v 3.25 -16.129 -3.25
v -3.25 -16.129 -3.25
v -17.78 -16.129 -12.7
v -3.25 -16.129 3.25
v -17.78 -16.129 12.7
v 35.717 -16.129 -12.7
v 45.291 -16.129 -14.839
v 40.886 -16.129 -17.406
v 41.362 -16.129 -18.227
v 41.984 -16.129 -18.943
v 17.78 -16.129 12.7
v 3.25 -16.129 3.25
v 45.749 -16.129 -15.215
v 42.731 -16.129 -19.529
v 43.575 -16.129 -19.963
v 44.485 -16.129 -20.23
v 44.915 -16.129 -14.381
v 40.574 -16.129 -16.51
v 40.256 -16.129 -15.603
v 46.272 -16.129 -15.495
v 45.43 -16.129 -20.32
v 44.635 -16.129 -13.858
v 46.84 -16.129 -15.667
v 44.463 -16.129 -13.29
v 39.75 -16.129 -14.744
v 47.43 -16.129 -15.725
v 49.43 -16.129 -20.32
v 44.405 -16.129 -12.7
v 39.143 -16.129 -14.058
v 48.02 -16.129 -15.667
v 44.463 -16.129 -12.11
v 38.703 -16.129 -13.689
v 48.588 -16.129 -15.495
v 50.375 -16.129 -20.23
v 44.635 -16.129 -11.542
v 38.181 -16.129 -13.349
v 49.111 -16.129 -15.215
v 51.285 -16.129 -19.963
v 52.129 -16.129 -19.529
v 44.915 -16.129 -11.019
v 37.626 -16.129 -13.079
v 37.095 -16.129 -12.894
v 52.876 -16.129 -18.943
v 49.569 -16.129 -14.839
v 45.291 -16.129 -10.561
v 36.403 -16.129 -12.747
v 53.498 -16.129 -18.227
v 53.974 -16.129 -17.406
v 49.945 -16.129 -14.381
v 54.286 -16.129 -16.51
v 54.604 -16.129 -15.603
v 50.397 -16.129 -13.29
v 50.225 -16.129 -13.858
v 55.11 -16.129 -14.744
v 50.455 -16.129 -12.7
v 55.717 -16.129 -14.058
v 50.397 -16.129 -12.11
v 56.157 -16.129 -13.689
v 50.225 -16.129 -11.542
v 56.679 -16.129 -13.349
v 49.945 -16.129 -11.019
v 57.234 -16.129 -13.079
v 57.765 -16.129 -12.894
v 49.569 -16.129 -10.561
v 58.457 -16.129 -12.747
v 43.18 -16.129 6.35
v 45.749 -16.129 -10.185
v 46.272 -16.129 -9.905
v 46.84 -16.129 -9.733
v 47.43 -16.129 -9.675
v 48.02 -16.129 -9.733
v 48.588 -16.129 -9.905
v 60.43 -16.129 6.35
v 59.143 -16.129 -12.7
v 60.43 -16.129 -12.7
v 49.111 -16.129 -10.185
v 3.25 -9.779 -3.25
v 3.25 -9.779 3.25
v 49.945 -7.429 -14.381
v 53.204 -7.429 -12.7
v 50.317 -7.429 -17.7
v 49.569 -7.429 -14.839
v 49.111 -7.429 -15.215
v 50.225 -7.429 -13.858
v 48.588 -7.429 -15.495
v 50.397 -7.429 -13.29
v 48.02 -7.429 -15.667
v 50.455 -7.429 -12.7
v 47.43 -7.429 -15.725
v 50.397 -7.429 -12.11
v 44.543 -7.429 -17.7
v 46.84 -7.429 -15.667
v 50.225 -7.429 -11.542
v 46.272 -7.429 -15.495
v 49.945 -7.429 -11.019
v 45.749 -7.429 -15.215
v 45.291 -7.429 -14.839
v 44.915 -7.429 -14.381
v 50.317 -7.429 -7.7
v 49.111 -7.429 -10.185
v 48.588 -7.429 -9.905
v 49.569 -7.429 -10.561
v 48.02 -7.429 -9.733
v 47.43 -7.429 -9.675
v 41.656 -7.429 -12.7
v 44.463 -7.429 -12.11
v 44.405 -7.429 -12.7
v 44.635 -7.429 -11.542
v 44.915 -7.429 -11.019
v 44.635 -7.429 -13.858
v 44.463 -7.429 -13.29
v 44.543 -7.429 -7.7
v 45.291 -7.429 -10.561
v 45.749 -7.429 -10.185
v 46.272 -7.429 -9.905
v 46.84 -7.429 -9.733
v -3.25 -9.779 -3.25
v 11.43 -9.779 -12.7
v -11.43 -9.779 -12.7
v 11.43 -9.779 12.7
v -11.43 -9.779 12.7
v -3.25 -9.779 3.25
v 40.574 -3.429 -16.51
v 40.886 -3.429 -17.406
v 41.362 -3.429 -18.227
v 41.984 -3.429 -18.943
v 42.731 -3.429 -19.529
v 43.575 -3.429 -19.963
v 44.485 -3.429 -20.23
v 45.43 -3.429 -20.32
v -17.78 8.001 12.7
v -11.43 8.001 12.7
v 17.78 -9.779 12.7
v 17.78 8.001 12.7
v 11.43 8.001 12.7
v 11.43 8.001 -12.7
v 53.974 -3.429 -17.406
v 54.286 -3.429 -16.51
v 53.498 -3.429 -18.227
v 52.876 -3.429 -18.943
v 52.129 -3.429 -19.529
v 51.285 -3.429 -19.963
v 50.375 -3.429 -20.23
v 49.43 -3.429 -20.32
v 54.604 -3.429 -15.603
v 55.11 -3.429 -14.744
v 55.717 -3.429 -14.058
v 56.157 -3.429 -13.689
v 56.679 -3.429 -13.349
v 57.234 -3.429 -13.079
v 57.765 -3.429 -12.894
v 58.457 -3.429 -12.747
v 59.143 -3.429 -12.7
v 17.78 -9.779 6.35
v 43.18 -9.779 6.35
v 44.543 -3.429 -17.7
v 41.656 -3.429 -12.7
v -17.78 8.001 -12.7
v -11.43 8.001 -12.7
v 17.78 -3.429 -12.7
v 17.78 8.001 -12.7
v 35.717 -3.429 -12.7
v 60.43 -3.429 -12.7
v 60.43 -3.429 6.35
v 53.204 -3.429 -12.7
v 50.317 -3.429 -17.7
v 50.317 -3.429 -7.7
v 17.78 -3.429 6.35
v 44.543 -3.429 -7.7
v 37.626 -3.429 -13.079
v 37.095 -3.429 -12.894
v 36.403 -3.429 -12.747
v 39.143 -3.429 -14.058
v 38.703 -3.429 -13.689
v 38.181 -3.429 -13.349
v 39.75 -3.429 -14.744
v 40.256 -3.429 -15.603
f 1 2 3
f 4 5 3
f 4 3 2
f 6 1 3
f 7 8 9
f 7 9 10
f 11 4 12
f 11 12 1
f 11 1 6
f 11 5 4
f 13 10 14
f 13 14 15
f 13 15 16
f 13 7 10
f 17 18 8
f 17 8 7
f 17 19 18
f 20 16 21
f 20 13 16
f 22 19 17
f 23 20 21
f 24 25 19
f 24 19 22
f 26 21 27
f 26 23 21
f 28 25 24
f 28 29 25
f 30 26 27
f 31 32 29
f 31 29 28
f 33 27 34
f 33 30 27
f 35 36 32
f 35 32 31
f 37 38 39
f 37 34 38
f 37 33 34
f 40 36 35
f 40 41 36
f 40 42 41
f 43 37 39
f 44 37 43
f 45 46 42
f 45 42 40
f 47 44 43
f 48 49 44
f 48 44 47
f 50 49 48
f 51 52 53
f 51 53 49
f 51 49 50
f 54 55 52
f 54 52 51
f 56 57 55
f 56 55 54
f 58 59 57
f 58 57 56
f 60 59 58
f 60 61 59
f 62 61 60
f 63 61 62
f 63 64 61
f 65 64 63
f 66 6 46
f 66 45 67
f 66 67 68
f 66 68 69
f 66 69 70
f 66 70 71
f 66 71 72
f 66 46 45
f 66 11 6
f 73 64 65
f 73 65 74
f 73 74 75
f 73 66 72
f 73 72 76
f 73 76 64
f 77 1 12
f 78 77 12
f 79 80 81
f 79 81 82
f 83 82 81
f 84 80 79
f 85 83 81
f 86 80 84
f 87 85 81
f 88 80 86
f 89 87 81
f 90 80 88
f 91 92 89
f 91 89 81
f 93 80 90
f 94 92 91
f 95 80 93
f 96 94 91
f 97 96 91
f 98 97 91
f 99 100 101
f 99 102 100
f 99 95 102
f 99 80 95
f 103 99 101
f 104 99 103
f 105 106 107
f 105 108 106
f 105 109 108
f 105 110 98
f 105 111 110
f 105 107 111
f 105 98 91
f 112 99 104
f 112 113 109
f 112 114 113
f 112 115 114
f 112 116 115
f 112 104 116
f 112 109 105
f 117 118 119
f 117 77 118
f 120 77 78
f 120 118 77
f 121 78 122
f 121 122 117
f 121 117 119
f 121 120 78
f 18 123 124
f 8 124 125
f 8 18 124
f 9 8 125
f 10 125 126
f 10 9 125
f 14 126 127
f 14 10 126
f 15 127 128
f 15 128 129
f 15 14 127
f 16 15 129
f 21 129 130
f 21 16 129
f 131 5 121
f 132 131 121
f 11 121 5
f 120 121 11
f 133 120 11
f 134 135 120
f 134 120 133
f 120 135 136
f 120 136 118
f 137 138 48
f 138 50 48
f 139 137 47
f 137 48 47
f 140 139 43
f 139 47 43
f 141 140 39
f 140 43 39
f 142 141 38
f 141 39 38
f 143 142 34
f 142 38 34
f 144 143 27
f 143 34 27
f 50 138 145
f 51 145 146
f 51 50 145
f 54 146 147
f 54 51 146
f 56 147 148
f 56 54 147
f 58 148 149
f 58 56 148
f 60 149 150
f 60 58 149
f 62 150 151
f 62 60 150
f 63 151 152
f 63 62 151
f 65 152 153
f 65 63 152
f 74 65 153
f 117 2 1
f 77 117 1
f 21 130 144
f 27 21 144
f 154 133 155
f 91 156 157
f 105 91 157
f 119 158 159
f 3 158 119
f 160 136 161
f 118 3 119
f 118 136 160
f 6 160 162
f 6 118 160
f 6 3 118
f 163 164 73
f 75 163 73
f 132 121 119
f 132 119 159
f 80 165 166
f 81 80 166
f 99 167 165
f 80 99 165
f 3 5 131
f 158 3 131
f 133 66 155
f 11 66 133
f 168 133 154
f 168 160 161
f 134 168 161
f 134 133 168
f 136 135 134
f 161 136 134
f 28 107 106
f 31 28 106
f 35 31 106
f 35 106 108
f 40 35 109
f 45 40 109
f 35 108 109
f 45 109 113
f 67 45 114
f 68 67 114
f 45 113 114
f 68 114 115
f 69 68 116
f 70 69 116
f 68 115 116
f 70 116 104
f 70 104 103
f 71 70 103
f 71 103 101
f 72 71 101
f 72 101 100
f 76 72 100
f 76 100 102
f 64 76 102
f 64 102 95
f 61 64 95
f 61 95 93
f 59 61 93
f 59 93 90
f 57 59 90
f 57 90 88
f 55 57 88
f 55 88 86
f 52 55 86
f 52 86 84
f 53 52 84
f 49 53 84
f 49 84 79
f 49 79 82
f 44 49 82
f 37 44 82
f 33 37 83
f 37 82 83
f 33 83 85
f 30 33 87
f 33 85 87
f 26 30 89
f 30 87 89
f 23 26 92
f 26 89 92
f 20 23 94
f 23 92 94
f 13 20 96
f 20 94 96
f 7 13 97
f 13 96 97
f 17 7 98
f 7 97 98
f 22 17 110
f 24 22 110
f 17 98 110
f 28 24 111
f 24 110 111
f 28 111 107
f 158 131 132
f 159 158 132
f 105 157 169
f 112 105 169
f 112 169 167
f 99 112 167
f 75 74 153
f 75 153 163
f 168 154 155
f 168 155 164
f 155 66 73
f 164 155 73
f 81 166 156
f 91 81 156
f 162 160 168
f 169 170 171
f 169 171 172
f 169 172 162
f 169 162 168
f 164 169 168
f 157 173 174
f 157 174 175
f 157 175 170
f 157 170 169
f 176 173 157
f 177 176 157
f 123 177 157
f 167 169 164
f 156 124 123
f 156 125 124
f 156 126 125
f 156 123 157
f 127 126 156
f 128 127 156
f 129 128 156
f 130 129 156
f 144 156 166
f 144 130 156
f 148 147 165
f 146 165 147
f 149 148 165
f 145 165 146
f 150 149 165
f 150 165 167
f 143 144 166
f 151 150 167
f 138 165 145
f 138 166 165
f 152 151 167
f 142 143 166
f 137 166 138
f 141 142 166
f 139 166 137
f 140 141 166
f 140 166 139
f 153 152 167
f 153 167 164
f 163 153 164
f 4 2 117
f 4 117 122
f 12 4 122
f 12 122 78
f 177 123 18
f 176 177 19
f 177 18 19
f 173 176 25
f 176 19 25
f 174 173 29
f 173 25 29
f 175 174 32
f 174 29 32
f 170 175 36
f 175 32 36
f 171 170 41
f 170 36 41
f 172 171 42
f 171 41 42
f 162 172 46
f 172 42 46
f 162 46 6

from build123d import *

# Parameters (mm, degrees)
F0_W      = 35.56
F0_H      = 32.258
F1_DEPTH  = 12.7
F2_R      = 3.25
F3_DEPTH  = 32.259
F4_W      = 6.5
F4_H      = 6.5
F5_DEPTH  = 25.4
F6_W      = 42.65
F6_H      = 12.7
F7_DEPTH  = 19.05
F9_DEPTH  = 6.35
F10_W     = 14
F10_H     = 12.7
F11_DEPTH = 7.62
F12_R     = 5
F13_R     = 3.025
F14_DEPTH = 12.701
F15_R     = 3.025
F16_DEPTH = 4
F17_R     = 5
F19_DEPTH = 50.8
F20_W     = 15.96225
F20_H     = 9.625087
F21_DEPTH = 50.8


with BuildPart() as f1:
    # F0 (on Top) → F1 (new body, symmetric)
    with BuildSketch(Plane.XY):
        Rectangle(F0_W, F0_H)
        Polygon((11.43, 9.779), (11.43, -9.779), (-11.43, -9.779), (-11.43, 9.779), (-7.366, 9.779), (-7.366, 3.937), (4.826, 3.937), (4.826, 9.779), align=None, mode=Mode.SUBTRACT)
    extrude(amount=F1_DEPTH, both=True)

    # F2 (on face) → F3 (cut, through all)
    with BuildSketch(Plane.XZ.offset(16.129)):
        Circle(F2_R)
    extrude(amount=-F3_DEPTH, mode=Mode.SUBTRACT)

    # F4 (on face) → F5 (cut)
    with BuildSketch(Plane.XZ.offset(16.129)):
        Rectangle(F4_W, F4_H)
    extrude(amount=-F5_DEPTH, mode=Mode.SUBTRACT)

    # F6 (on face) → F7 (join)
    with BuildSketch(Plane(origin=(0, 0, -12.7), x_dir=(1, 0, 0), z_dir=(0, 0, -1))):
        with Locations((39.105, 9.779)):
            Rectangle(F6_W, F6_H)
    extrude(amount=-F7_DEPTH)

    # F8 (on face) → F9 (join)
    with BuildSketch(Plane.XZ.offset(16.129)):
        Polygon((17.78, 12.7), (17.78, 6.35), (43.18, 6.35), align=None)
    extrude(amount=-F9_DEPTH)

    # F10 (on face) → F11 (join)
    with BuildSketch(Plane(origin=(0, 0, -12.7), x_dir=(1, 0, 0), z_dir=(0, 0, -1))):
        with Locations((47.43, 9.779)):
            Rectangle(F10_W, F10_H)
    extrude(amount=F11_DEPTH)

    # F12
    f12_edges = [f1.edges().sort_by_distance(p)[0] for p in [
        (40.43, -9.779, -20.32),
        (54.43, -9.779, -20.32),
    ]]
    fillet(f12_edges, radius=F12_R)

    # F13 (on face) → F14 (cut, through all)
    with BuildSketch(Plane(origin=(0, -3.429, 0), x_dir=(-1, 0, 0), z_dir=(0, 1, 0))):
        with Locations((-47.43, -12.7)):
            Circle(F13_R)
    extrude(amount=-F14_DEPTH, mode=Mode.SUBTRACT)

    # F15 (on face) → F16 (cut)
    with BuildSketch(Plane(origin=(0, -3.429, 0), x_dir=(-1, 0, 0), z_dir=(0, 1, 0))):
        Polygon((-50.316751, -17.7), (-44.543249, -17.7), (-41.656497, -12.7), (-44.543249, -7.7), (-50.316751, -7.7), (-53.203503, -12.7), align=None)
        with Locations((-47.43, -12.7)):
            Circle(F15_R, mode=Mode.SUBTRACT)
    extrude(amount=-F16_DEPTH, mode=Mode.SUBTRACT)

    # F17
    f17_edges = [f1.edges().sort_by_distance(p)[0] for p in [
        (54.43, -9.779, -12.7),
        (40.43, -9.779, -12.7),
    ]]
    fillet(f17_edges, radius=F17_R)

    # F18 (on face) → F19 (cut)
    with BuildSketch(Plane.XY.offset(12.7)):
        Polygon((-17.78, 16.129), (-17.78, 8.001), (-11.43, 8.001), (-11.43, 9.779), (-7.366, 9.779), (-7.366, 8.001), (4.826, 8.001), (4.826, 9.779), (11.43, 9.779), (11.43, 8.001), (17.78, 8.001), (17.78, 16.129), align=None)
    extrude(amount=-F19_DEPTH, mode=Mode.SUBTRACT)

    # F20 (on face) → F21 (cut)
    with BuildSketch(Plane.XY.offset(12.7)):
        with Locations((0, 6.352621)):
            Rectangle(F20_W, F20_H)
    extrude(amount=-F21_DEPTH, mode=Mode.SUBTRACT)


solid = f1.part
